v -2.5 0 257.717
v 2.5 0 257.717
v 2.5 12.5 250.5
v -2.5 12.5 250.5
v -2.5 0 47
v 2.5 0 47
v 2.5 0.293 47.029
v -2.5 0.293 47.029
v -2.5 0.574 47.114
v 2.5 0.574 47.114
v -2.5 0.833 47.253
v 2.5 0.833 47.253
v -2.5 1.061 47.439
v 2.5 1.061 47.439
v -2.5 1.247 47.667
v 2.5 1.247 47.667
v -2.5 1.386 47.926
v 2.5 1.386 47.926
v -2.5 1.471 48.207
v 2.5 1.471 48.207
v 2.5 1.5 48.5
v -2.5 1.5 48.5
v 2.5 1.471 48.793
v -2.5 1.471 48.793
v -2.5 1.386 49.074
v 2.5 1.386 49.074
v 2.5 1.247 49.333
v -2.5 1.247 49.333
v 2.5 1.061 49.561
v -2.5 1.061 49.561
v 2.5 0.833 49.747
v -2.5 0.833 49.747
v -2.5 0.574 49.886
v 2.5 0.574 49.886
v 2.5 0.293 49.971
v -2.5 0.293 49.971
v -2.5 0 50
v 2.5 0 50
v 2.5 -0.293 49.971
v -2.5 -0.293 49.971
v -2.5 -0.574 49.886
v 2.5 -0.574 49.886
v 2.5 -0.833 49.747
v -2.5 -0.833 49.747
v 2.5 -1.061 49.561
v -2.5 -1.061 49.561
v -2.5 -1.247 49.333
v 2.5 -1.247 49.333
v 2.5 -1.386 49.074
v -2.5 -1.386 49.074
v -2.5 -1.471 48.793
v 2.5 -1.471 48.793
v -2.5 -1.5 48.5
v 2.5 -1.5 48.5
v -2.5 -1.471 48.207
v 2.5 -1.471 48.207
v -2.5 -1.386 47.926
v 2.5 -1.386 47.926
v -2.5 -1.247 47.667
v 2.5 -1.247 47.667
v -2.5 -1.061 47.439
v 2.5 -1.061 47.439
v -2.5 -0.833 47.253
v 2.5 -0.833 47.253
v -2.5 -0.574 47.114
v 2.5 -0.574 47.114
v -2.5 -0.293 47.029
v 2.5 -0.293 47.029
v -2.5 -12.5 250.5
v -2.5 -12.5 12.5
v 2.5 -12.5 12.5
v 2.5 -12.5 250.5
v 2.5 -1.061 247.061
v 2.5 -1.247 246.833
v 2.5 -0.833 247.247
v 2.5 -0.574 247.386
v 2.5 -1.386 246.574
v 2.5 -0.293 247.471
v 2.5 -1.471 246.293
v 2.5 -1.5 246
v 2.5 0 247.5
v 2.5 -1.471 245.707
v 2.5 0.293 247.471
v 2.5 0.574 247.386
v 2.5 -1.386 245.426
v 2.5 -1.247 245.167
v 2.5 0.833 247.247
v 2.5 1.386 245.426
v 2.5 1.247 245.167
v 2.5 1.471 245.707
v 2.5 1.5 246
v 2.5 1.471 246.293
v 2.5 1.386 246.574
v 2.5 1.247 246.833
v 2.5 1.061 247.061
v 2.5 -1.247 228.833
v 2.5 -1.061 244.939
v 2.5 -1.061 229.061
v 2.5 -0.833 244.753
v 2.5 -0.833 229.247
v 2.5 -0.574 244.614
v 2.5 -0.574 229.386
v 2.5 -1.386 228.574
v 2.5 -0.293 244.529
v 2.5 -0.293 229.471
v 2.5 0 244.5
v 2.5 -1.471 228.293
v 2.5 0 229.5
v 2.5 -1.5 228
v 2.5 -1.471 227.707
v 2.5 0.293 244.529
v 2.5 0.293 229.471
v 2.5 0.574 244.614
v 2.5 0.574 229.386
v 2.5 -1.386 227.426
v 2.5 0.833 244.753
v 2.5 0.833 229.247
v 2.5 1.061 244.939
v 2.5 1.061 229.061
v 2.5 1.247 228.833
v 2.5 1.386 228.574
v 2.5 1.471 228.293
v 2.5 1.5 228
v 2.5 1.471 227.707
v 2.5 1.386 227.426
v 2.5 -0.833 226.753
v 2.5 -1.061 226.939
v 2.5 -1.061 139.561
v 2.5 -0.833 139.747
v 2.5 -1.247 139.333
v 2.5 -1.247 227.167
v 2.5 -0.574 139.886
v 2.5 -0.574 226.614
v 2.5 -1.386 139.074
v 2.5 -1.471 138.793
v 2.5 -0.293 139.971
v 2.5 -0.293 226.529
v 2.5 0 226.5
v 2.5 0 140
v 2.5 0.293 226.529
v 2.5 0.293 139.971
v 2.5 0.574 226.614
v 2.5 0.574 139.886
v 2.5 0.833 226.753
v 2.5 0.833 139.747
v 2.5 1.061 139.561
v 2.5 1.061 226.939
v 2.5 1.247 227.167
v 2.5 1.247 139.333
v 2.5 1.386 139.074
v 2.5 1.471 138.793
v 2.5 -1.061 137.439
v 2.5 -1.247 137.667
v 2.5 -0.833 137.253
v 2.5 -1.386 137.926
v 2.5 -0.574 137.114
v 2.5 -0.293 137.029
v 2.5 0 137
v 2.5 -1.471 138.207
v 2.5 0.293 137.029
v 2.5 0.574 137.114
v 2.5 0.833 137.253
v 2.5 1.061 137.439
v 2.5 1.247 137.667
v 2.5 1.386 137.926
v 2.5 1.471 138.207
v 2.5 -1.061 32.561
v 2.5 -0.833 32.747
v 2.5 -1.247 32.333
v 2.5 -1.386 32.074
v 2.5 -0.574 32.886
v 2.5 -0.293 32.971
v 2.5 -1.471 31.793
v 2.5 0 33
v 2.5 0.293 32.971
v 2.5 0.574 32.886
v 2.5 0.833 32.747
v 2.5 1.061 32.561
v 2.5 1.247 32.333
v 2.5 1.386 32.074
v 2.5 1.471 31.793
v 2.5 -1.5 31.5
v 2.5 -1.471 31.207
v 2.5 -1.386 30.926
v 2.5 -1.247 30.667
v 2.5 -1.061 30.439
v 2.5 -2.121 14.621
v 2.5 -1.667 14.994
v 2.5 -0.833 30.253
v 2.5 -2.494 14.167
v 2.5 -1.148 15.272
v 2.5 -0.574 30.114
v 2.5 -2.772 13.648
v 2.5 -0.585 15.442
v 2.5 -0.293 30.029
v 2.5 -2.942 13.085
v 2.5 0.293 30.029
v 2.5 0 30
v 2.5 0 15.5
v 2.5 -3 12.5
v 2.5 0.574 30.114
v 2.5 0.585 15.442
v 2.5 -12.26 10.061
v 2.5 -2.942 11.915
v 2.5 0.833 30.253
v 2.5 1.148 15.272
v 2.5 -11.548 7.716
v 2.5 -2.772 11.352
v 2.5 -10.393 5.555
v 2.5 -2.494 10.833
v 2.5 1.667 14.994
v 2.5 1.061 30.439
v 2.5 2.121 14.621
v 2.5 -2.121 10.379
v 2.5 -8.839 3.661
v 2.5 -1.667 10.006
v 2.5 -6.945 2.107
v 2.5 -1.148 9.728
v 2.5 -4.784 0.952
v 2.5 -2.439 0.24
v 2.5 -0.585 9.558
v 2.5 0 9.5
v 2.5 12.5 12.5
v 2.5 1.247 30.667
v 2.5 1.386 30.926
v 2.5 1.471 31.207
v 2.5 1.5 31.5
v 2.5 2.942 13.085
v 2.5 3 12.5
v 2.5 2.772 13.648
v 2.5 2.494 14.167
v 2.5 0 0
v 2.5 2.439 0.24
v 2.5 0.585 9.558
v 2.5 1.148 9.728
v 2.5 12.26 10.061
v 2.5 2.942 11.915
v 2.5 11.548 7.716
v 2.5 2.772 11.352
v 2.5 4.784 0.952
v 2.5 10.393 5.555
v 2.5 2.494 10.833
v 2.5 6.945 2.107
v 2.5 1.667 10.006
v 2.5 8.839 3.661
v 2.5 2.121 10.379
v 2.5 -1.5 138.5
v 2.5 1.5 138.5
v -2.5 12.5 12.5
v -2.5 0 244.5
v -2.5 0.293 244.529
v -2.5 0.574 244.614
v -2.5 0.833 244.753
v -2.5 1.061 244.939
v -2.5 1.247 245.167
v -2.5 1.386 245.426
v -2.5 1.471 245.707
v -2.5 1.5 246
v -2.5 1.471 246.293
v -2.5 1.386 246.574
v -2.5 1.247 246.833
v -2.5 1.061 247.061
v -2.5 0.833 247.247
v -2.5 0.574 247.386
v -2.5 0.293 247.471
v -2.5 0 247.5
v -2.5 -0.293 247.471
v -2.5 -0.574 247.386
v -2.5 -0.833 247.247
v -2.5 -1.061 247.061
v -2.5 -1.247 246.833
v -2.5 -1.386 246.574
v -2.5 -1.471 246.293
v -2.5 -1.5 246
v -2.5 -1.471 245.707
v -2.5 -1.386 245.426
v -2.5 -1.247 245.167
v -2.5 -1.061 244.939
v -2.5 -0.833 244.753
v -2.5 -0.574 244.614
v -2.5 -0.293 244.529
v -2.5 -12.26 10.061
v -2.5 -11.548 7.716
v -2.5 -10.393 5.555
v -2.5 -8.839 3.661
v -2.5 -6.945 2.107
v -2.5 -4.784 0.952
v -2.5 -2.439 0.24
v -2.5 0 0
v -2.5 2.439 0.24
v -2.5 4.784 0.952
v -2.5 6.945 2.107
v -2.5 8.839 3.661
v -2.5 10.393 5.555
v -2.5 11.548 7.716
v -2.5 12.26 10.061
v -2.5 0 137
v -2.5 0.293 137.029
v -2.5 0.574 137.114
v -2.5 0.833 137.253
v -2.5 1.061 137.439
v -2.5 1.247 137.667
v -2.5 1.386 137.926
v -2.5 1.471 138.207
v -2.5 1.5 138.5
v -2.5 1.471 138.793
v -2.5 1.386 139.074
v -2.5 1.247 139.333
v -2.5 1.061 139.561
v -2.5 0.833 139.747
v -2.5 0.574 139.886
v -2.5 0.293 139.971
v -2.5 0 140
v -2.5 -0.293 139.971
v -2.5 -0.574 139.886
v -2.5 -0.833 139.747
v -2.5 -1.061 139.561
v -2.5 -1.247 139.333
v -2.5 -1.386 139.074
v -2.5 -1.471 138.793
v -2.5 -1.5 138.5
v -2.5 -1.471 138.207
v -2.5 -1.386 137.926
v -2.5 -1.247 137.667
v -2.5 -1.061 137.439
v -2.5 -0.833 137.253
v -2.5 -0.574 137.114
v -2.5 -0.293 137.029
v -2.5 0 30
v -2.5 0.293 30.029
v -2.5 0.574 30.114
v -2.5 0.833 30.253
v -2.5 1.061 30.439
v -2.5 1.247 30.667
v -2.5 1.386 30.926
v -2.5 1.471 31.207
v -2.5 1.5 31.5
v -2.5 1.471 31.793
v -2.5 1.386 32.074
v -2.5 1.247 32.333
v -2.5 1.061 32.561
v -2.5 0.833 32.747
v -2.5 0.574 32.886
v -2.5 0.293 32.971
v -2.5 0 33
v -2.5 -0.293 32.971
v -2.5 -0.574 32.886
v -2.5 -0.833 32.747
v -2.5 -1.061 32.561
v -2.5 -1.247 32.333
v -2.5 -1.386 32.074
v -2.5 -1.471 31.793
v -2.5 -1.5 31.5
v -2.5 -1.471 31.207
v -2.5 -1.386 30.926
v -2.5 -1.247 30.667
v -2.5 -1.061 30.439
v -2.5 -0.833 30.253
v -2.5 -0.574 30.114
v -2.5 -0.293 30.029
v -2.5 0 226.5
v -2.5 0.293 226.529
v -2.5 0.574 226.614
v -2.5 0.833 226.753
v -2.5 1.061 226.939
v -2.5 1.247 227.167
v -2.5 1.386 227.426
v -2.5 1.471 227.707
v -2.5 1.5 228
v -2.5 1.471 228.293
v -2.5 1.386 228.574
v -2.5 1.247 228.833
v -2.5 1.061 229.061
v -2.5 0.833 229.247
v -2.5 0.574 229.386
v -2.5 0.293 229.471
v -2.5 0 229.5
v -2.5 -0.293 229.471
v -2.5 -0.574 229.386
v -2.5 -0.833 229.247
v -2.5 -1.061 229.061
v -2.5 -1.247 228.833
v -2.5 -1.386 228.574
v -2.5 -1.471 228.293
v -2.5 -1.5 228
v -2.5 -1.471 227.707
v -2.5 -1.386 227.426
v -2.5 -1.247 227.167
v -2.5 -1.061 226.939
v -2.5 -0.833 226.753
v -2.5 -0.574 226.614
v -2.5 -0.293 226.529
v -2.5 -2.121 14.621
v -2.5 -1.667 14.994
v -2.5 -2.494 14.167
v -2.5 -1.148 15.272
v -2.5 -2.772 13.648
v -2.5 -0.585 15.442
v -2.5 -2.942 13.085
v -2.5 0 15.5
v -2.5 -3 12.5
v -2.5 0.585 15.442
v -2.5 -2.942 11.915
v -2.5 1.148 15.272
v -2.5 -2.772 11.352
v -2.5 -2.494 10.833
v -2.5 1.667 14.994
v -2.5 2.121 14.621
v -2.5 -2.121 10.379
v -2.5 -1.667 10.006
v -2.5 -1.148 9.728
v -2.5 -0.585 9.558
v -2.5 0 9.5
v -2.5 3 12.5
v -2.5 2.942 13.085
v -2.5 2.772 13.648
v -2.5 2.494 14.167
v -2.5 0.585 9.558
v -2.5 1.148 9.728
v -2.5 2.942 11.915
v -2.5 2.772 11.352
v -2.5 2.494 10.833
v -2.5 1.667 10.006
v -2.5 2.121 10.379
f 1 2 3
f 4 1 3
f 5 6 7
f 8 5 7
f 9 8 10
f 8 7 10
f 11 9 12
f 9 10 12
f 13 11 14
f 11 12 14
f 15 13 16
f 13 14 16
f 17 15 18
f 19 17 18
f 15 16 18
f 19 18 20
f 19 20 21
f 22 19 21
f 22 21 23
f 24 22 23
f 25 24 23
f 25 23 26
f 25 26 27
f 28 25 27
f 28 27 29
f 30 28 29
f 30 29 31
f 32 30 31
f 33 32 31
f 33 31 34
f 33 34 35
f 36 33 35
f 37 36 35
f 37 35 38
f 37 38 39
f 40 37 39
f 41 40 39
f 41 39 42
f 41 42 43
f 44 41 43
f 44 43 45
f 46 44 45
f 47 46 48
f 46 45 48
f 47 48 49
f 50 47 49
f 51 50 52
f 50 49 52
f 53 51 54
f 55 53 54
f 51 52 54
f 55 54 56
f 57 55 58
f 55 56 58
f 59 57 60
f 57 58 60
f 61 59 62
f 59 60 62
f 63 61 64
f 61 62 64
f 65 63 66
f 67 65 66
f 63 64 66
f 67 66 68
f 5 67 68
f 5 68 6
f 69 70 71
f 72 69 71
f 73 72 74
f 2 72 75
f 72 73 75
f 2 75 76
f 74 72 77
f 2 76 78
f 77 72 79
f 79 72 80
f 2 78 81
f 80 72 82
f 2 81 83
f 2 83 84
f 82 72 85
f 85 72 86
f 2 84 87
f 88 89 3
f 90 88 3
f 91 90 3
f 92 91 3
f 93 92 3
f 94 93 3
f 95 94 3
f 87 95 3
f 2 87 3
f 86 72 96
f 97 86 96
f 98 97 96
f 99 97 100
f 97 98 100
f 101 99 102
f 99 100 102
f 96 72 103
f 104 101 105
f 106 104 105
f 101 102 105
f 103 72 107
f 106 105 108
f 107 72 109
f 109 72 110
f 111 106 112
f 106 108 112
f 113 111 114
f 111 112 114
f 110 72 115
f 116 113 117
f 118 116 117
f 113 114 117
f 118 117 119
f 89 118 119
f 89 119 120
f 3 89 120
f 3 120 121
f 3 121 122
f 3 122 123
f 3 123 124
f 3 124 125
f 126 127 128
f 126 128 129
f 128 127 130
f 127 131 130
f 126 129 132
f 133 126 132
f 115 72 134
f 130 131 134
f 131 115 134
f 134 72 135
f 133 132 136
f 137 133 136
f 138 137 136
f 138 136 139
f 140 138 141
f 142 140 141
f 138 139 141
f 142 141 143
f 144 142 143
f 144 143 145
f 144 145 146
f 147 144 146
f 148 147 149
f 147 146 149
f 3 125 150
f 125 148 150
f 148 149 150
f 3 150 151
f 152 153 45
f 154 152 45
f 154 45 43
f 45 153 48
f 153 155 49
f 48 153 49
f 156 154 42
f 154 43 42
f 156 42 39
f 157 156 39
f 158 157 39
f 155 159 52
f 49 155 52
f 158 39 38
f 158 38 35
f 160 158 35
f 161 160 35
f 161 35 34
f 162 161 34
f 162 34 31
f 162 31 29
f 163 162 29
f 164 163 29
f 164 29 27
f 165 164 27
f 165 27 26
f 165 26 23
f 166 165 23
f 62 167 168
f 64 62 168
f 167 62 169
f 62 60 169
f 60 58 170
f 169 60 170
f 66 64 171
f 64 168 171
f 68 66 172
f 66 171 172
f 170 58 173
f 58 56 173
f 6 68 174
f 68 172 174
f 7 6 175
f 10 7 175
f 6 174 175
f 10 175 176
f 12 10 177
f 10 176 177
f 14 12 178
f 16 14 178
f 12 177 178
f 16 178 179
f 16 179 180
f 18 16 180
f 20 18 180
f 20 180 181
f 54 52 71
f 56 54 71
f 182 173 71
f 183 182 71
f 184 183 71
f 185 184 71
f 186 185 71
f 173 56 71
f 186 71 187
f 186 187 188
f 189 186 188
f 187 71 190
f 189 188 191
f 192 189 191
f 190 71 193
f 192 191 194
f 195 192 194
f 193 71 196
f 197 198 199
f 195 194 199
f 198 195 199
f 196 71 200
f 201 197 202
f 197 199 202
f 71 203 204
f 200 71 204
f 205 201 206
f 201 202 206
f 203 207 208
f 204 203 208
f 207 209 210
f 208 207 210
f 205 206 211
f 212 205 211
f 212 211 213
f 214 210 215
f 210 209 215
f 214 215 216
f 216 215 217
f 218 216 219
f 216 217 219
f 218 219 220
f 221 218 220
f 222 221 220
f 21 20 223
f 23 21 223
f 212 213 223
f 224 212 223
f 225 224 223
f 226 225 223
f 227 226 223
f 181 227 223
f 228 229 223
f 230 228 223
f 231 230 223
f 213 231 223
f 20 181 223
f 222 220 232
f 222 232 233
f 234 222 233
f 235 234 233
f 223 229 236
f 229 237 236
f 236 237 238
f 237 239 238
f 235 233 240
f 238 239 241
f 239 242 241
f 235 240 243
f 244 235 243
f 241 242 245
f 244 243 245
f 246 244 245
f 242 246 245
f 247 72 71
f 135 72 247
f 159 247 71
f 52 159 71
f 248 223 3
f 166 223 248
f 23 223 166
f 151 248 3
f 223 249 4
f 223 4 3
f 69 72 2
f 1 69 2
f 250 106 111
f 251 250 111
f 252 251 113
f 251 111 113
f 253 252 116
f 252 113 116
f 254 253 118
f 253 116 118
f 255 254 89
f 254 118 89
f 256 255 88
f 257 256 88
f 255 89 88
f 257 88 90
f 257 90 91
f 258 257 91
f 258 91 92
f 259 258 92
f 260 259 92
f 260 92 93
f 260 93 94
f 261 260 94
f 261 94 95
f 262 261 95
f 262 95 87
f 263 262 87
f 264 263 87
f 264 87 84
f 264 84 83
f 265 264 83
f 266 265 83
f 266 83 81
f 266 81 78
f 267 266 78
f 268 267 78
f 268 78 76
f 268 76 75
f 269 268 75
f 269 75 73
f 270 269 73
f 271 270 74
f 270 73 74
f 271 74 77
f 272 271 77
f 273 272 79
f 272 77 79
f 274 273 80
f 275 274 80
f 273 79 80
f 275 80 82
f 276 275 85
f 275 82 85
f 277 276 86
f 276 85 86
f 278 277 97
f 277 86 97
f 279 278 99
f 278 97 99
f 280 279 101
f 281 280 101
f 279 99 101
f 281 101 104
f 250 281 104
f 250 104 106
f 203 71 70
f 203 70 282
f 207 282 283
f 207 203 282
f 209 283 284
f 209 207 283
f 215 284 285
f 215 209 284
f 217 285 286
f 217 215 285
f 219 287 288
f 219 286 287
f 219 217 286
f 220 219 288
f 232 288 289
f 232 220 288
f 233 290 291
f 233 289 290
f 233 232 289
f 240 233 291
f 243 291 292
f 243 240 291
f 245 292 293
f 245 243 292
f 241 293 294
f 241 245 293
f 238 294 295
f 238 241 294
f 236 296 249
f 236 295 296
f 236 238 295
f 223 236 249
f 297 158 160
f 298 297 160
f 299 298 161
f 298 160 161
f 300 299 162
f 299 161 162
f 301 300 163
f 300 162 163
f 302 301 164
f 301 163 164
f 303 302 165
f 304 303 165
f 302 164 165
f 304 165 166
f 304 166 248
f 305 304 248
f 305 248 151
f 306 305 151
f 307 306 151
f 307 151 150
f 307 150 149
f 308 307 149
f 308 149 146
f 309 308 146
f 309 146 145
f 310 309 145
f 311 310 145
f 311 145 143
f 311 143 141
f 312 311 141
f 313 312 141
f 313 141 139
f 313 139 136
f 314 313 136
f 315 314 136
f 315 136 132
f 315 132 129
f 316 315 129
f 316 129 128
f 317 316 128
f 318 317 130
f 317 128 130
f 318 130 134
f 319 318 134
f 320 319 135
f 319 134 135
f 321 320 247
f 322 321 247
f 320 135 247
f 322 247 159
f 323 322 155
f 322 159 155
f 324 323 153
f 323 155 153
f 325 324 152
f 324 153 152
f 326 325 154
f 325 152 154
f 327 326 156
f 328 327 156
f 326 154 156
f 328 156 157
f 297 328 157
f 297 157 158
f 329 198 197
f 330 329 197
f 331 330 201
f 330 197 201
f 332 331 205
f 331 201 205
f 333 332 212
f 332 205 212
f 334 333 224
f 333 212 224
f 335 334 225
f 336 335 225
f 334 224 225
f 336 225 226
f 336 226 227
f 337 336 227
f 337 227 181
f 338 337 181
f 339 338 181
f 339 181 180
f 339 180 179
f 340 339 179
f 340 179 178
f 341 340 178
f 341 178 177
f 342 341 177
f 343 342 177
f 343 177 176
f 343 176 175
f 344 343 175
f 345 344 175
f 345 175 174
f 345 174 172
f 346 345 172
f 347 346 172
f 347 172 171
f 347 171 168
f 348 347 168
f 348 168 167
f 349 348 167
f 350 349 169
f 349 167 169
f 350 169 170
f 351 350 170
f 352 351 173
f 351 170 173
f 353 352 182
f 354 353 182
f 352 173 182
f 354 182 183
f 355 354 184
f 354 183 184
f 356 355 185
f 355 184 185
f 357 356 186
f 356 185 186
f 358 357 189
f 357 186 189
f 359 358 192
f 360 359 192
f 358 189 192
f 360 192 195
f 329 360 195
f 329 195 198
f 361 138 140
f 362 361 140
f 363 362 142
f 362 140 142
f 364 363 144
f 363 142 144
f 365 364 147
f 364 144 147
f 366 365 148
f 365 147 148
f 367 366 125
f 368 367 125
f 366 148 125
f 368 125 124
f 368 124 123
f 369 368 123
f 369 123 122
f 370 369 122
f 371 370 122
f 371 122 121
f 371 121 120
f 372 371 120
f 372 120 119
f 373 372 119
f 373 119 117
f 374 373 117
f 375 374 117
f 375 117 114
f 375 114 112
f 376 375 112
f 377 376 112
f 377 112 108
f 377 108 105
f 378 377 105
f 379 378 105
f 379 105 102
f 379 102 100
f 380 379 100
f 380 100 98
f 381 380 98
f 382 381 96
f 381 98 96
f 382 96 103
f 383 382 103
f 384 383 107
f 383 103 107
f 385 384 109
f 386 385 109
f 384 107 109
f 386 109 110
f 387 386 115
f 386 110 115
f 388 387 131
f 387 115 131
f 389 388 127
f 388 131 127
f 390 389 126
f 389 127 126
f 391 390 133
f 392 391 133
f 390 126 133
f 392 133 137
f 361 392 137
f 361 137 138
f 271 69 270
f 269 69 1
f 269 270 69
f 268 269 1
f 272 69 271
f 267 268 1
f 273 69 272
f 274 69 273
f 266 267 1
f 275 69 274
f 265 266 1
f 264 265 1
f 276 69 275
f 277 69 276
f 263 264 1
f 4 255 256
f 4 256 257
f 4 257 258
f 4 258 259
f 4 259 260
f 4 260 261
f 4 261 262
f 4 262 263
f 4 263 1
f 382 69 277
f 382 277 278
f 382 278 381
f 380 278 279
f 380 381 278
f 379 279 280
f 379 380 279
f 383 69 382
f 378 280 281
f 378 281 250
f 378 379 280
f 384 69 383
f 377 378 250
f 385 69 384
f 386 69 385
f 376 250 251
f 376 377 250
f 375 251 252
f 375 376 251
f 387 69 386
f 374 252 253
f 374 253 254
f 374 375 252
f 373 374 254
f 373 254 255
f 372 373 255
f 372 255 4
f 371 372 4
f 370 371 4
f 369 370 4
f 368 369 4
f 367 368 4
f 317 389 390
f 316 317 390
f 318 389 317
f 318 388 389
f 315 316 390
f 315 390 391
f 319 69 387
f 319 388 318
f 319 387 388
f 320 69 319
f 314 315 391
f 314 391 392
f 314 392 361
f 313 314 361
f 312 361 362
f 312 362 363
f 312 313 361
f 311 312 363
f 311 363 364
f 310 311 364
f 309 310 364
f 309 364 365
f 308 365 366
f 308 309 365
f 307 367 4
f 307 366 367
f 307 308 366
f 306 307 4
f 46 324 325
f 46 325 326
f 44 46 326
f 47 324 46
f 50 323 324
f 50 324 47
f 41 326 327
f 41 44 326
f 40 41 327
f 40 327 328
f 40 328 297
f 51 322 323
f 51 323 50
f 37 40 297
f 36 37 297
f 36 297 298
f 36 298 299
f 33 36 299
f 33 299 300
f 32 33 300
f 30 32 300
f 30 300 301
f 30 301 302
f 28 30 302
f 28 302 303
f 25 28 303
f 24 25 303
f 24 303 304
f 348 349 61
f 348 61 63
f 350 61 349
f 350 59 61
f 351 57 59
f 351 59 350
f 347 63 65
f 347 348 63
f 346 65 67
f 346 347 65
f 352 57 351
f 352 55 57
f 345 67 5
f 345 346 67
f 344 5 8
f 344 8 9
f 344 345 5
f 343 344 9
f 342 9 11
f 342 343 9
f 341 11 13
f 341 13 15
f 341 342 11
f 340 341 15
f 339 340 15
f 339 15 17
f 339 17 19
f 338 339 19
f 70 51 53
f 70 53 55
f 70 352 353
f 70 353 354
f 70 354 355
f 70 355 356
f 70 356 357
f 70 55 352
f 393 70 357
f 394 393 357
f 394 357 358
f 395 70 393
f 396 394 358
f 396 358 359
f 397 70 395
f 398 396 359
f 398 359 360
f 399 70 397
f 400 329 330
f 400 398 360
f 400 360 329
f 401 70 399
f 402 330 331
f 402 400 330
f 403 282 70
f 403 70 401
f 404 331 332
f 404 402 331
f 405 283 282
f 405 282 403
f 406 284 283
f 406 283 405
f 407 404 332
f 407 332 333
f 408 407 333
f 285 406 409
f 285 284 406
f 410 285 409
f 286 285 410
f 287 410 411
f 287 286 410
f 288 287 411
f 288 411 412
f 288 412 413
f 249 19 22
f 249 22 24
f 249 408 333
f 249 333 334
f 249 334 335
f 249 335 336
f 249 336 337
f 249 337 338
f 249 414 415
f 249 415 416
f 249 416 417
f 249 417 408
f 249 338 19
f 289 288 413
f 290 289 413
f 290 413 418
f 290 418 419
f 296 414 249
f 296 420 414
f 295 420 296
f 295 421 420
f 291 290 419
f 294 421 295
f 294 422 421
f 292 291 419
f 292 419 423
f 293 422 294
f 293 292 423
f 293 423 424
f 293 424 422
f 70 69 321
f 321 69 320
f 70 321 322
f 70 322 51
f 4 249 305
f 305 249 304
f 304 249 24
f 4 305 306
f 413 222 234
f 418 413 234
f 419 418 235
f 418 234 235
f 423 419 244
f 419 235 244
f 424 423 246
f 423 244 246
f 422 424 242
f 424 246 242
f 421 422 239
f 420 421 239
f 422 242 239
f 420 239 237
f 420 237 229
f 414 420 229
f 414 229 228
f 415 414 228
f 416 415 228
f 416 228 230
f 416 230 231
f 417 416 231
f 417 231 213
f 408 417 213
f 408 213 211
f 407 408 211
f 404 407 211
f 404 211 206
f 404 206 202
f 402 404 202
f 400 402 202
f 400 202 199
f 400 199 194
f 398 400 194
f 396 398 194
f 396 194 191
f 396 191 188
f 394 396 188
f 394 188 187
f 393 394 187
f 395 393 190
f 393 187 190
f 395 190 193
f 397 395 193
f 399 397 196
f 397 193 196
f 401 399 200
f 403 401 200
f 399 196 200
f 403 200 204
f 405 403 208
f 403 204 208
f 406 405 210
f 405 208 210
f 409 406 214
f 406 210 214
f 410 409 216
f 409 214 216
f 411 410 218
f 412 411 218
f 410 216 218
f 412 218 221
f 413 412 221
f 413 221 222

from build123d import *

# Parameters (mm, degrees)
SKETCH1_W           = 5
SKETCH1_H           = 25
BOSS_EXTRUDE1_DEPTH = 258.5
SKETCH2_R           = 3
SKETCH2_R_2         = 1.5
CUT_EXTRUDE1_DEPTH  = 259.850342862


with BuildPart() as part:
    # Sketch1 → Boss-Extrude1 (new body)
    with BuildSketch(Plane.XY):
        Rectangle(SKETCH1_W, SKETCH1_H)
    extrude(amount=BOSS_EXTRUDE1_DEPTH)

    # Sketch2 → Cut-Extrude1 (cut, through all)
    with BuildSketch(Plane(origin=(2.5, 0, 0), x_dir=(0, 0, -1), z_dir=(1, 0, 0))):
        with Locations((-12.5, 0)):
            Circle(SKETCH2_R)
        with Locations((-246, 0)):
            Circle(SKETCH2_R_2)
        with Locations((-228, 0)):
            Circle(SKETCH2_R_2)
        with Locations((-48.5, 0)):
            Circle(SKETCH2_R_2)
        with Locations((-31.5, 0)):
            Circle(SKETCH2_R_2)
        with Locations((-138.5, 0)):
            Circle(SKETCH2_R_2)
        with BuildLine():
            Line((-12.5, 12.5), (5.5, 12.5))
            Line((5.5, 12.5), (5.5, -12.5))
            Line((5.5, -12.5), (-12.5, -12.5))
            ThreePointArc((-12.5, -12.5), (0, 0), (-12.5, 12.5))
        make_face()
        Polygon((-257.716878365, 0), (-250.5, 12.5), (-258.5, 12.5), (-258.5, -12.5), (-250.5, -12.5), align=None)
    extrude(amount=-CUT_EXTRUDE1_DEPTH, mode=Mode.SUBTRACT)


solid = part.part
